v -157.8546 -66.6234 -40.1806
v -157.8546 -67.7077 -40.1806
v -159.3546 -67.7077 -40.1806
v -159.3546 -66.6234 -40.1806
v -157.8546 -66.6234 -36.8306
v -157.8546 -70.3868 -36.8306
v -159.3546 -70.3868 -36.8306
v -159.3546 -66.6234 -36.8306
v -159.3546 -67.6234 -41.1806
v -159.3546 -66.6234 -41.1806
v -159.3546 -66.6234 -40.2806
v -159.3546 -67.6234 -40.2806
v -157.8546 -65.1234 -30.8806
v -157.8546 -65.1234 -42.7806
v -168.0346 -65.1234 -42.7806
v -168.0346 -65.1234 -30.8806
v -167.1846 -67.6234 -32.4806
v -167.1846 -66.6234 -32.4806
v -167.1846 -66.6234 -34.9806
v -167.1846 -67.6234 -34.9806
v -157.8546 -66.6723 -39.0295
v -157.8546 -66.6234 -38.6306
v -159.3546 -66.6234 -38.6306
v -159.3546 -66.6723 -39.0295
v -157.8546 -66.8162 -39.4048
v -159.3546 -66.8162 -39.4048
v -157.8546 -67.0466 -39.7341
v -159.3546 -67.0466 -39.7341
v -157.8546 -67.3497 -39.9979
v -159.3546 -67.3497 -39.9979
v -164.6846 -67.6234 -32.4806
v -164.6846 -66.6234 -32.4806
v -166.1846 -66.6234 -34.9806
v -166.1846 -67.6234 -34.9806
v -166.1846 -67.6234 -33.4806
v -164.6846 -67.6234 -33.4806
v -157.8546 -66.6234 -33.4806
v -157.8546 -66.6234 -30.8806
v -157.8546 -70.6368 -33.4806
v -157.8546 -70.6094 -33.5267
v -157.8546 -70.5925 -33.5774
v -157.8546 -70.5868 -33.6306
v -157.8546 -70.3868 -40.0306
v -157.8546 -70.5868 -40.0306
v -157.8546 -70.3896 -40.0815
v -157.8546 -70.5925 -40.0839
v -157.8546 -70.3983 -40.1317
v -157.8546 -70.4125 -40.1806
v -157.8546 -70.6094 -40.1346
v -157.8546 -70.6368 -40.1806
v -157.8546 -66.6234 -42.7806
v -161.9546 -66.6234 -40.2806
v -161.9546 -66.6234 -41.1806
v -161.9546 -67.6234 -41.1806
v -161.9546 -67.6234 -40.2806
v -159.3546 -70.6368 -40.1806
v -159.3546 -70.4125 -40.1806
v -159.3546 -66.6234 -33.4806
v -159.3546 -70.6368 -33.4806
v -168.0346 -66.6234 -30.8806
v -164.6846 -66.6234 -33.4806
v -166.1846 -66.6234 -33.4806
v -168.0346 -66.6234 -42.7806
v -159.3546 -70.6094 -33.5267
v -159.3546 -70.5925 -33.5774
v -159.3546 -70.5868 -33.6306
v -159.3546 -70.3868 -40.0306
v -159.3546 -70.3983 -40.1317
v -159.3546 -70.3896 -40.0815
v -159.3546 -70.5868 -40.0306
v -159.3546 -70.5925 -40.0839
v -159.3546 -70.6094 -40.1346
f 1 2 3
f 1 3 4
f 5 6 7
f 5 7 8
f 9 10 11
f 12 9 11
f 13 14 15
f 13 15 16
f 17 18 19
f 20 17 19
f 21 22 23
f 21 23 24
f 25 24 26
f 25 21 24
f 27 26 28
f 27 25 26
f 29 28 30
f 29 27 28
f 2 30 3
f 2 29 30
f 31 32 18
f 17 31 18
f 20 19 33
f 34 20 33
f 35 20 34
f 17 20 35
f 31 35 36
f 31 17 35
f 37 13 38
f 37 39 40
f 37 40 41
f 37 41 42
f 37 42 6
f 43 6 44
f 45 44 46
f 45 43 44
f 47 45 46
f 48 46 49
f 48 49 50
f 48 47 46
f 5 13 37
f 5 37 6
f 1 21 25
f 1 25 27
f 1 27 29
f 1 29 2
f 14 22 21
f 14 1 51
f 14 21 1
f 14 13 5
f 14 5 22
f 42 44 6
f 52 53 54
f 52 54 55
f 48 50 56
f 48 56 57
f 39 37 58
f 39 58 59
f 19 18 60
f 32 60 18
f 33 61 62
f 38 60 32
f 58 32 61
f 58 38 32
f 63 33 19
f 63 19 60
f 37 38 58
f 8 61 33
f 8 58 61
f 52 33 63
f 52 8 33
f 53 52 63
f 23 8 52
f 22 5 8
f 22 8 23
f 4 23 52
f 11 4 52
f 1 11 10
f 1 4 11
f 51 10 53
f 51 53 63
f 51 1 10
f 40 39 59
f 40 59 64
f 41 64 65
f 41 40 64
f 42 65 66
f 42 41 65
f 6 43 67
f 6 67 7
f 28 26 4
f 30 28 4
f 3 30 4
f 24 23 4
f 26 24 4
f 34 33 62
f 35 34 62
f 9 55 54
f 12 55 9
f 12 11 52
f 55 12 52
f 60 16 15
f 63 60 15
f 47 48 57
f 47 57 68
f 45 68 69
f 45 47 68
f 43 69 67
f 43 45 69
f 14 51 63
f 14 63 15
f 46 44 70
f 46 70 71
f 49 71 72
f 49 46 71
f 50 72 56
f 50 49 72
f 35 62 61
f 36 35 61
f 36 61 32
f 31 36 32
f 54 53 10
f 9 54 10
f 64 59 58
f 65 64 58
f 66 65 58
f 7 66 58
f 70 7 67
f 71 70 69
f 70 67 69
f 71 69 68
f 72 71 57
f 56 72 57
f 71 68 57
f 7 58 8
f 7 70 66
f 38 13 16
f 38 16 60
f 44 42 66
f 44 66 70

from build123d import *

# Parameters (mm, degrees)
BOSS_EXTRUDE1_DEPTH = 1.5
BOSS_EXTRUDE2_DEPTH = 10.18
SKETCH2_W           = 2.5
SKETCH2_H           = 0.9
SKETCH2_W_2         = 0.1
BOSS_EXTRUDE3_DEPTH = 1


with BuildPart() as part:
    # Sketch1 → Boss-Extrude1 (new body)
    with BuildSketch(Plane(origin=(-157.854562907, 0, 0), x_dir=(0, 0, -1), z_dir=(1, 0, 0))):
        with BuildLine():
            Line((30.880645232, -65.123367101), (30.880645232, -66.623367101))
            Line((30.880645232, -66.623367101), (33.480645232, -66.623367101))
            Line((33.480645232, -66.623367101), (33.480645232, -70.636755446))
            ThreePointArc((33.480645232, -70.636755446), (33.551588291, -70.599584622), (33.630645232, -70.586755446))
            Line((33.630645232, -70.586755446), (40.030645232, -70.586755446))
            ThreePointArc((40.030645232, -70.586755446), (40.109702174, -70.599584622), (40.180645232, -70.636755446))
            Line((40.180645232, -70.636755446), (40.180645232, -70.412491378))
            ThreePointArc((40.180645232, -70.412491378), (40.106741123, -70.393236094), (40.030645232, -70.386755446))
            Line((40.030645232, -70.386755446), (36.830645232, -70.386755446))
            Line((36.830645232, -70.386755446), (36.830645232, -66.623367101))
            Line((36.830645232, -66.623367101), (38.630645232, -66.623367101))
            ThreePointArc((38.630645232, -66.623367101), (39.576456801, -66.921353611), (40.180645232, -67.707681676))
            Line((40.180645232, -67.707681676), (40.180645232, -66.623367101))
            Line((40.180645232, -66.623367101), (42.780645232, -66.623367101))
            Line((42.780645232, -66.623367101), (42.780645232, -65.123367101))
            Line((42.780645232, -65.123367101), (30.880645232, -65.123367101))
        make_face()
    extrude(amount=-BOSS_EXTRUDE1_DEPTH)

    # Sketch1<3> → Boss-Extrude2 (add)
    with BuildSketch(Plane(origin=(-157.854562907, 0, 0), x_dir=(0, 0, -1), z_dir=(1, 0, 0))):
        Polygon((30.880645232, -65.123367101), (30.880645232, -66.623367101), (33.380645232, -66.623367101), (33.480645232, -66.623367101), (38.630645232, -66.623367101), (40.180645232, -66.623367101), (40.280645232, -66.623367101), (42.780645232, -66.623367101), (42.780645232, -65.123367101), align=None)
    extrude(amount=-BOSS_EXTRUDE2_DEPTH)

    # Sketch2 → Boss-Extrude3 (add)
    with BuildSketch(Plane.XZ.offset(66.623367101)):
        Polygon((-167.184562907, -32.480645232), (-167.184562907, -34.980645232), (-166.184562907, -34.980645232), (-166.184562907, -33.480645232), (-164.684562907, -33.480645232), (-164.684562907, -32.480645232), align=None)
        with Locations((-160.704562907, -40.730645232)):
            Rectangle(SKETCH2_W, SKETCH2_H)
        with Locations((-159.404562907, -40.730645232)):
            Rectangle(SKETCH2_W_2, SKETCH2_H)
    extrude(amount=BOSS_EXTRUDE3_DEPTH)


solid = part.part
